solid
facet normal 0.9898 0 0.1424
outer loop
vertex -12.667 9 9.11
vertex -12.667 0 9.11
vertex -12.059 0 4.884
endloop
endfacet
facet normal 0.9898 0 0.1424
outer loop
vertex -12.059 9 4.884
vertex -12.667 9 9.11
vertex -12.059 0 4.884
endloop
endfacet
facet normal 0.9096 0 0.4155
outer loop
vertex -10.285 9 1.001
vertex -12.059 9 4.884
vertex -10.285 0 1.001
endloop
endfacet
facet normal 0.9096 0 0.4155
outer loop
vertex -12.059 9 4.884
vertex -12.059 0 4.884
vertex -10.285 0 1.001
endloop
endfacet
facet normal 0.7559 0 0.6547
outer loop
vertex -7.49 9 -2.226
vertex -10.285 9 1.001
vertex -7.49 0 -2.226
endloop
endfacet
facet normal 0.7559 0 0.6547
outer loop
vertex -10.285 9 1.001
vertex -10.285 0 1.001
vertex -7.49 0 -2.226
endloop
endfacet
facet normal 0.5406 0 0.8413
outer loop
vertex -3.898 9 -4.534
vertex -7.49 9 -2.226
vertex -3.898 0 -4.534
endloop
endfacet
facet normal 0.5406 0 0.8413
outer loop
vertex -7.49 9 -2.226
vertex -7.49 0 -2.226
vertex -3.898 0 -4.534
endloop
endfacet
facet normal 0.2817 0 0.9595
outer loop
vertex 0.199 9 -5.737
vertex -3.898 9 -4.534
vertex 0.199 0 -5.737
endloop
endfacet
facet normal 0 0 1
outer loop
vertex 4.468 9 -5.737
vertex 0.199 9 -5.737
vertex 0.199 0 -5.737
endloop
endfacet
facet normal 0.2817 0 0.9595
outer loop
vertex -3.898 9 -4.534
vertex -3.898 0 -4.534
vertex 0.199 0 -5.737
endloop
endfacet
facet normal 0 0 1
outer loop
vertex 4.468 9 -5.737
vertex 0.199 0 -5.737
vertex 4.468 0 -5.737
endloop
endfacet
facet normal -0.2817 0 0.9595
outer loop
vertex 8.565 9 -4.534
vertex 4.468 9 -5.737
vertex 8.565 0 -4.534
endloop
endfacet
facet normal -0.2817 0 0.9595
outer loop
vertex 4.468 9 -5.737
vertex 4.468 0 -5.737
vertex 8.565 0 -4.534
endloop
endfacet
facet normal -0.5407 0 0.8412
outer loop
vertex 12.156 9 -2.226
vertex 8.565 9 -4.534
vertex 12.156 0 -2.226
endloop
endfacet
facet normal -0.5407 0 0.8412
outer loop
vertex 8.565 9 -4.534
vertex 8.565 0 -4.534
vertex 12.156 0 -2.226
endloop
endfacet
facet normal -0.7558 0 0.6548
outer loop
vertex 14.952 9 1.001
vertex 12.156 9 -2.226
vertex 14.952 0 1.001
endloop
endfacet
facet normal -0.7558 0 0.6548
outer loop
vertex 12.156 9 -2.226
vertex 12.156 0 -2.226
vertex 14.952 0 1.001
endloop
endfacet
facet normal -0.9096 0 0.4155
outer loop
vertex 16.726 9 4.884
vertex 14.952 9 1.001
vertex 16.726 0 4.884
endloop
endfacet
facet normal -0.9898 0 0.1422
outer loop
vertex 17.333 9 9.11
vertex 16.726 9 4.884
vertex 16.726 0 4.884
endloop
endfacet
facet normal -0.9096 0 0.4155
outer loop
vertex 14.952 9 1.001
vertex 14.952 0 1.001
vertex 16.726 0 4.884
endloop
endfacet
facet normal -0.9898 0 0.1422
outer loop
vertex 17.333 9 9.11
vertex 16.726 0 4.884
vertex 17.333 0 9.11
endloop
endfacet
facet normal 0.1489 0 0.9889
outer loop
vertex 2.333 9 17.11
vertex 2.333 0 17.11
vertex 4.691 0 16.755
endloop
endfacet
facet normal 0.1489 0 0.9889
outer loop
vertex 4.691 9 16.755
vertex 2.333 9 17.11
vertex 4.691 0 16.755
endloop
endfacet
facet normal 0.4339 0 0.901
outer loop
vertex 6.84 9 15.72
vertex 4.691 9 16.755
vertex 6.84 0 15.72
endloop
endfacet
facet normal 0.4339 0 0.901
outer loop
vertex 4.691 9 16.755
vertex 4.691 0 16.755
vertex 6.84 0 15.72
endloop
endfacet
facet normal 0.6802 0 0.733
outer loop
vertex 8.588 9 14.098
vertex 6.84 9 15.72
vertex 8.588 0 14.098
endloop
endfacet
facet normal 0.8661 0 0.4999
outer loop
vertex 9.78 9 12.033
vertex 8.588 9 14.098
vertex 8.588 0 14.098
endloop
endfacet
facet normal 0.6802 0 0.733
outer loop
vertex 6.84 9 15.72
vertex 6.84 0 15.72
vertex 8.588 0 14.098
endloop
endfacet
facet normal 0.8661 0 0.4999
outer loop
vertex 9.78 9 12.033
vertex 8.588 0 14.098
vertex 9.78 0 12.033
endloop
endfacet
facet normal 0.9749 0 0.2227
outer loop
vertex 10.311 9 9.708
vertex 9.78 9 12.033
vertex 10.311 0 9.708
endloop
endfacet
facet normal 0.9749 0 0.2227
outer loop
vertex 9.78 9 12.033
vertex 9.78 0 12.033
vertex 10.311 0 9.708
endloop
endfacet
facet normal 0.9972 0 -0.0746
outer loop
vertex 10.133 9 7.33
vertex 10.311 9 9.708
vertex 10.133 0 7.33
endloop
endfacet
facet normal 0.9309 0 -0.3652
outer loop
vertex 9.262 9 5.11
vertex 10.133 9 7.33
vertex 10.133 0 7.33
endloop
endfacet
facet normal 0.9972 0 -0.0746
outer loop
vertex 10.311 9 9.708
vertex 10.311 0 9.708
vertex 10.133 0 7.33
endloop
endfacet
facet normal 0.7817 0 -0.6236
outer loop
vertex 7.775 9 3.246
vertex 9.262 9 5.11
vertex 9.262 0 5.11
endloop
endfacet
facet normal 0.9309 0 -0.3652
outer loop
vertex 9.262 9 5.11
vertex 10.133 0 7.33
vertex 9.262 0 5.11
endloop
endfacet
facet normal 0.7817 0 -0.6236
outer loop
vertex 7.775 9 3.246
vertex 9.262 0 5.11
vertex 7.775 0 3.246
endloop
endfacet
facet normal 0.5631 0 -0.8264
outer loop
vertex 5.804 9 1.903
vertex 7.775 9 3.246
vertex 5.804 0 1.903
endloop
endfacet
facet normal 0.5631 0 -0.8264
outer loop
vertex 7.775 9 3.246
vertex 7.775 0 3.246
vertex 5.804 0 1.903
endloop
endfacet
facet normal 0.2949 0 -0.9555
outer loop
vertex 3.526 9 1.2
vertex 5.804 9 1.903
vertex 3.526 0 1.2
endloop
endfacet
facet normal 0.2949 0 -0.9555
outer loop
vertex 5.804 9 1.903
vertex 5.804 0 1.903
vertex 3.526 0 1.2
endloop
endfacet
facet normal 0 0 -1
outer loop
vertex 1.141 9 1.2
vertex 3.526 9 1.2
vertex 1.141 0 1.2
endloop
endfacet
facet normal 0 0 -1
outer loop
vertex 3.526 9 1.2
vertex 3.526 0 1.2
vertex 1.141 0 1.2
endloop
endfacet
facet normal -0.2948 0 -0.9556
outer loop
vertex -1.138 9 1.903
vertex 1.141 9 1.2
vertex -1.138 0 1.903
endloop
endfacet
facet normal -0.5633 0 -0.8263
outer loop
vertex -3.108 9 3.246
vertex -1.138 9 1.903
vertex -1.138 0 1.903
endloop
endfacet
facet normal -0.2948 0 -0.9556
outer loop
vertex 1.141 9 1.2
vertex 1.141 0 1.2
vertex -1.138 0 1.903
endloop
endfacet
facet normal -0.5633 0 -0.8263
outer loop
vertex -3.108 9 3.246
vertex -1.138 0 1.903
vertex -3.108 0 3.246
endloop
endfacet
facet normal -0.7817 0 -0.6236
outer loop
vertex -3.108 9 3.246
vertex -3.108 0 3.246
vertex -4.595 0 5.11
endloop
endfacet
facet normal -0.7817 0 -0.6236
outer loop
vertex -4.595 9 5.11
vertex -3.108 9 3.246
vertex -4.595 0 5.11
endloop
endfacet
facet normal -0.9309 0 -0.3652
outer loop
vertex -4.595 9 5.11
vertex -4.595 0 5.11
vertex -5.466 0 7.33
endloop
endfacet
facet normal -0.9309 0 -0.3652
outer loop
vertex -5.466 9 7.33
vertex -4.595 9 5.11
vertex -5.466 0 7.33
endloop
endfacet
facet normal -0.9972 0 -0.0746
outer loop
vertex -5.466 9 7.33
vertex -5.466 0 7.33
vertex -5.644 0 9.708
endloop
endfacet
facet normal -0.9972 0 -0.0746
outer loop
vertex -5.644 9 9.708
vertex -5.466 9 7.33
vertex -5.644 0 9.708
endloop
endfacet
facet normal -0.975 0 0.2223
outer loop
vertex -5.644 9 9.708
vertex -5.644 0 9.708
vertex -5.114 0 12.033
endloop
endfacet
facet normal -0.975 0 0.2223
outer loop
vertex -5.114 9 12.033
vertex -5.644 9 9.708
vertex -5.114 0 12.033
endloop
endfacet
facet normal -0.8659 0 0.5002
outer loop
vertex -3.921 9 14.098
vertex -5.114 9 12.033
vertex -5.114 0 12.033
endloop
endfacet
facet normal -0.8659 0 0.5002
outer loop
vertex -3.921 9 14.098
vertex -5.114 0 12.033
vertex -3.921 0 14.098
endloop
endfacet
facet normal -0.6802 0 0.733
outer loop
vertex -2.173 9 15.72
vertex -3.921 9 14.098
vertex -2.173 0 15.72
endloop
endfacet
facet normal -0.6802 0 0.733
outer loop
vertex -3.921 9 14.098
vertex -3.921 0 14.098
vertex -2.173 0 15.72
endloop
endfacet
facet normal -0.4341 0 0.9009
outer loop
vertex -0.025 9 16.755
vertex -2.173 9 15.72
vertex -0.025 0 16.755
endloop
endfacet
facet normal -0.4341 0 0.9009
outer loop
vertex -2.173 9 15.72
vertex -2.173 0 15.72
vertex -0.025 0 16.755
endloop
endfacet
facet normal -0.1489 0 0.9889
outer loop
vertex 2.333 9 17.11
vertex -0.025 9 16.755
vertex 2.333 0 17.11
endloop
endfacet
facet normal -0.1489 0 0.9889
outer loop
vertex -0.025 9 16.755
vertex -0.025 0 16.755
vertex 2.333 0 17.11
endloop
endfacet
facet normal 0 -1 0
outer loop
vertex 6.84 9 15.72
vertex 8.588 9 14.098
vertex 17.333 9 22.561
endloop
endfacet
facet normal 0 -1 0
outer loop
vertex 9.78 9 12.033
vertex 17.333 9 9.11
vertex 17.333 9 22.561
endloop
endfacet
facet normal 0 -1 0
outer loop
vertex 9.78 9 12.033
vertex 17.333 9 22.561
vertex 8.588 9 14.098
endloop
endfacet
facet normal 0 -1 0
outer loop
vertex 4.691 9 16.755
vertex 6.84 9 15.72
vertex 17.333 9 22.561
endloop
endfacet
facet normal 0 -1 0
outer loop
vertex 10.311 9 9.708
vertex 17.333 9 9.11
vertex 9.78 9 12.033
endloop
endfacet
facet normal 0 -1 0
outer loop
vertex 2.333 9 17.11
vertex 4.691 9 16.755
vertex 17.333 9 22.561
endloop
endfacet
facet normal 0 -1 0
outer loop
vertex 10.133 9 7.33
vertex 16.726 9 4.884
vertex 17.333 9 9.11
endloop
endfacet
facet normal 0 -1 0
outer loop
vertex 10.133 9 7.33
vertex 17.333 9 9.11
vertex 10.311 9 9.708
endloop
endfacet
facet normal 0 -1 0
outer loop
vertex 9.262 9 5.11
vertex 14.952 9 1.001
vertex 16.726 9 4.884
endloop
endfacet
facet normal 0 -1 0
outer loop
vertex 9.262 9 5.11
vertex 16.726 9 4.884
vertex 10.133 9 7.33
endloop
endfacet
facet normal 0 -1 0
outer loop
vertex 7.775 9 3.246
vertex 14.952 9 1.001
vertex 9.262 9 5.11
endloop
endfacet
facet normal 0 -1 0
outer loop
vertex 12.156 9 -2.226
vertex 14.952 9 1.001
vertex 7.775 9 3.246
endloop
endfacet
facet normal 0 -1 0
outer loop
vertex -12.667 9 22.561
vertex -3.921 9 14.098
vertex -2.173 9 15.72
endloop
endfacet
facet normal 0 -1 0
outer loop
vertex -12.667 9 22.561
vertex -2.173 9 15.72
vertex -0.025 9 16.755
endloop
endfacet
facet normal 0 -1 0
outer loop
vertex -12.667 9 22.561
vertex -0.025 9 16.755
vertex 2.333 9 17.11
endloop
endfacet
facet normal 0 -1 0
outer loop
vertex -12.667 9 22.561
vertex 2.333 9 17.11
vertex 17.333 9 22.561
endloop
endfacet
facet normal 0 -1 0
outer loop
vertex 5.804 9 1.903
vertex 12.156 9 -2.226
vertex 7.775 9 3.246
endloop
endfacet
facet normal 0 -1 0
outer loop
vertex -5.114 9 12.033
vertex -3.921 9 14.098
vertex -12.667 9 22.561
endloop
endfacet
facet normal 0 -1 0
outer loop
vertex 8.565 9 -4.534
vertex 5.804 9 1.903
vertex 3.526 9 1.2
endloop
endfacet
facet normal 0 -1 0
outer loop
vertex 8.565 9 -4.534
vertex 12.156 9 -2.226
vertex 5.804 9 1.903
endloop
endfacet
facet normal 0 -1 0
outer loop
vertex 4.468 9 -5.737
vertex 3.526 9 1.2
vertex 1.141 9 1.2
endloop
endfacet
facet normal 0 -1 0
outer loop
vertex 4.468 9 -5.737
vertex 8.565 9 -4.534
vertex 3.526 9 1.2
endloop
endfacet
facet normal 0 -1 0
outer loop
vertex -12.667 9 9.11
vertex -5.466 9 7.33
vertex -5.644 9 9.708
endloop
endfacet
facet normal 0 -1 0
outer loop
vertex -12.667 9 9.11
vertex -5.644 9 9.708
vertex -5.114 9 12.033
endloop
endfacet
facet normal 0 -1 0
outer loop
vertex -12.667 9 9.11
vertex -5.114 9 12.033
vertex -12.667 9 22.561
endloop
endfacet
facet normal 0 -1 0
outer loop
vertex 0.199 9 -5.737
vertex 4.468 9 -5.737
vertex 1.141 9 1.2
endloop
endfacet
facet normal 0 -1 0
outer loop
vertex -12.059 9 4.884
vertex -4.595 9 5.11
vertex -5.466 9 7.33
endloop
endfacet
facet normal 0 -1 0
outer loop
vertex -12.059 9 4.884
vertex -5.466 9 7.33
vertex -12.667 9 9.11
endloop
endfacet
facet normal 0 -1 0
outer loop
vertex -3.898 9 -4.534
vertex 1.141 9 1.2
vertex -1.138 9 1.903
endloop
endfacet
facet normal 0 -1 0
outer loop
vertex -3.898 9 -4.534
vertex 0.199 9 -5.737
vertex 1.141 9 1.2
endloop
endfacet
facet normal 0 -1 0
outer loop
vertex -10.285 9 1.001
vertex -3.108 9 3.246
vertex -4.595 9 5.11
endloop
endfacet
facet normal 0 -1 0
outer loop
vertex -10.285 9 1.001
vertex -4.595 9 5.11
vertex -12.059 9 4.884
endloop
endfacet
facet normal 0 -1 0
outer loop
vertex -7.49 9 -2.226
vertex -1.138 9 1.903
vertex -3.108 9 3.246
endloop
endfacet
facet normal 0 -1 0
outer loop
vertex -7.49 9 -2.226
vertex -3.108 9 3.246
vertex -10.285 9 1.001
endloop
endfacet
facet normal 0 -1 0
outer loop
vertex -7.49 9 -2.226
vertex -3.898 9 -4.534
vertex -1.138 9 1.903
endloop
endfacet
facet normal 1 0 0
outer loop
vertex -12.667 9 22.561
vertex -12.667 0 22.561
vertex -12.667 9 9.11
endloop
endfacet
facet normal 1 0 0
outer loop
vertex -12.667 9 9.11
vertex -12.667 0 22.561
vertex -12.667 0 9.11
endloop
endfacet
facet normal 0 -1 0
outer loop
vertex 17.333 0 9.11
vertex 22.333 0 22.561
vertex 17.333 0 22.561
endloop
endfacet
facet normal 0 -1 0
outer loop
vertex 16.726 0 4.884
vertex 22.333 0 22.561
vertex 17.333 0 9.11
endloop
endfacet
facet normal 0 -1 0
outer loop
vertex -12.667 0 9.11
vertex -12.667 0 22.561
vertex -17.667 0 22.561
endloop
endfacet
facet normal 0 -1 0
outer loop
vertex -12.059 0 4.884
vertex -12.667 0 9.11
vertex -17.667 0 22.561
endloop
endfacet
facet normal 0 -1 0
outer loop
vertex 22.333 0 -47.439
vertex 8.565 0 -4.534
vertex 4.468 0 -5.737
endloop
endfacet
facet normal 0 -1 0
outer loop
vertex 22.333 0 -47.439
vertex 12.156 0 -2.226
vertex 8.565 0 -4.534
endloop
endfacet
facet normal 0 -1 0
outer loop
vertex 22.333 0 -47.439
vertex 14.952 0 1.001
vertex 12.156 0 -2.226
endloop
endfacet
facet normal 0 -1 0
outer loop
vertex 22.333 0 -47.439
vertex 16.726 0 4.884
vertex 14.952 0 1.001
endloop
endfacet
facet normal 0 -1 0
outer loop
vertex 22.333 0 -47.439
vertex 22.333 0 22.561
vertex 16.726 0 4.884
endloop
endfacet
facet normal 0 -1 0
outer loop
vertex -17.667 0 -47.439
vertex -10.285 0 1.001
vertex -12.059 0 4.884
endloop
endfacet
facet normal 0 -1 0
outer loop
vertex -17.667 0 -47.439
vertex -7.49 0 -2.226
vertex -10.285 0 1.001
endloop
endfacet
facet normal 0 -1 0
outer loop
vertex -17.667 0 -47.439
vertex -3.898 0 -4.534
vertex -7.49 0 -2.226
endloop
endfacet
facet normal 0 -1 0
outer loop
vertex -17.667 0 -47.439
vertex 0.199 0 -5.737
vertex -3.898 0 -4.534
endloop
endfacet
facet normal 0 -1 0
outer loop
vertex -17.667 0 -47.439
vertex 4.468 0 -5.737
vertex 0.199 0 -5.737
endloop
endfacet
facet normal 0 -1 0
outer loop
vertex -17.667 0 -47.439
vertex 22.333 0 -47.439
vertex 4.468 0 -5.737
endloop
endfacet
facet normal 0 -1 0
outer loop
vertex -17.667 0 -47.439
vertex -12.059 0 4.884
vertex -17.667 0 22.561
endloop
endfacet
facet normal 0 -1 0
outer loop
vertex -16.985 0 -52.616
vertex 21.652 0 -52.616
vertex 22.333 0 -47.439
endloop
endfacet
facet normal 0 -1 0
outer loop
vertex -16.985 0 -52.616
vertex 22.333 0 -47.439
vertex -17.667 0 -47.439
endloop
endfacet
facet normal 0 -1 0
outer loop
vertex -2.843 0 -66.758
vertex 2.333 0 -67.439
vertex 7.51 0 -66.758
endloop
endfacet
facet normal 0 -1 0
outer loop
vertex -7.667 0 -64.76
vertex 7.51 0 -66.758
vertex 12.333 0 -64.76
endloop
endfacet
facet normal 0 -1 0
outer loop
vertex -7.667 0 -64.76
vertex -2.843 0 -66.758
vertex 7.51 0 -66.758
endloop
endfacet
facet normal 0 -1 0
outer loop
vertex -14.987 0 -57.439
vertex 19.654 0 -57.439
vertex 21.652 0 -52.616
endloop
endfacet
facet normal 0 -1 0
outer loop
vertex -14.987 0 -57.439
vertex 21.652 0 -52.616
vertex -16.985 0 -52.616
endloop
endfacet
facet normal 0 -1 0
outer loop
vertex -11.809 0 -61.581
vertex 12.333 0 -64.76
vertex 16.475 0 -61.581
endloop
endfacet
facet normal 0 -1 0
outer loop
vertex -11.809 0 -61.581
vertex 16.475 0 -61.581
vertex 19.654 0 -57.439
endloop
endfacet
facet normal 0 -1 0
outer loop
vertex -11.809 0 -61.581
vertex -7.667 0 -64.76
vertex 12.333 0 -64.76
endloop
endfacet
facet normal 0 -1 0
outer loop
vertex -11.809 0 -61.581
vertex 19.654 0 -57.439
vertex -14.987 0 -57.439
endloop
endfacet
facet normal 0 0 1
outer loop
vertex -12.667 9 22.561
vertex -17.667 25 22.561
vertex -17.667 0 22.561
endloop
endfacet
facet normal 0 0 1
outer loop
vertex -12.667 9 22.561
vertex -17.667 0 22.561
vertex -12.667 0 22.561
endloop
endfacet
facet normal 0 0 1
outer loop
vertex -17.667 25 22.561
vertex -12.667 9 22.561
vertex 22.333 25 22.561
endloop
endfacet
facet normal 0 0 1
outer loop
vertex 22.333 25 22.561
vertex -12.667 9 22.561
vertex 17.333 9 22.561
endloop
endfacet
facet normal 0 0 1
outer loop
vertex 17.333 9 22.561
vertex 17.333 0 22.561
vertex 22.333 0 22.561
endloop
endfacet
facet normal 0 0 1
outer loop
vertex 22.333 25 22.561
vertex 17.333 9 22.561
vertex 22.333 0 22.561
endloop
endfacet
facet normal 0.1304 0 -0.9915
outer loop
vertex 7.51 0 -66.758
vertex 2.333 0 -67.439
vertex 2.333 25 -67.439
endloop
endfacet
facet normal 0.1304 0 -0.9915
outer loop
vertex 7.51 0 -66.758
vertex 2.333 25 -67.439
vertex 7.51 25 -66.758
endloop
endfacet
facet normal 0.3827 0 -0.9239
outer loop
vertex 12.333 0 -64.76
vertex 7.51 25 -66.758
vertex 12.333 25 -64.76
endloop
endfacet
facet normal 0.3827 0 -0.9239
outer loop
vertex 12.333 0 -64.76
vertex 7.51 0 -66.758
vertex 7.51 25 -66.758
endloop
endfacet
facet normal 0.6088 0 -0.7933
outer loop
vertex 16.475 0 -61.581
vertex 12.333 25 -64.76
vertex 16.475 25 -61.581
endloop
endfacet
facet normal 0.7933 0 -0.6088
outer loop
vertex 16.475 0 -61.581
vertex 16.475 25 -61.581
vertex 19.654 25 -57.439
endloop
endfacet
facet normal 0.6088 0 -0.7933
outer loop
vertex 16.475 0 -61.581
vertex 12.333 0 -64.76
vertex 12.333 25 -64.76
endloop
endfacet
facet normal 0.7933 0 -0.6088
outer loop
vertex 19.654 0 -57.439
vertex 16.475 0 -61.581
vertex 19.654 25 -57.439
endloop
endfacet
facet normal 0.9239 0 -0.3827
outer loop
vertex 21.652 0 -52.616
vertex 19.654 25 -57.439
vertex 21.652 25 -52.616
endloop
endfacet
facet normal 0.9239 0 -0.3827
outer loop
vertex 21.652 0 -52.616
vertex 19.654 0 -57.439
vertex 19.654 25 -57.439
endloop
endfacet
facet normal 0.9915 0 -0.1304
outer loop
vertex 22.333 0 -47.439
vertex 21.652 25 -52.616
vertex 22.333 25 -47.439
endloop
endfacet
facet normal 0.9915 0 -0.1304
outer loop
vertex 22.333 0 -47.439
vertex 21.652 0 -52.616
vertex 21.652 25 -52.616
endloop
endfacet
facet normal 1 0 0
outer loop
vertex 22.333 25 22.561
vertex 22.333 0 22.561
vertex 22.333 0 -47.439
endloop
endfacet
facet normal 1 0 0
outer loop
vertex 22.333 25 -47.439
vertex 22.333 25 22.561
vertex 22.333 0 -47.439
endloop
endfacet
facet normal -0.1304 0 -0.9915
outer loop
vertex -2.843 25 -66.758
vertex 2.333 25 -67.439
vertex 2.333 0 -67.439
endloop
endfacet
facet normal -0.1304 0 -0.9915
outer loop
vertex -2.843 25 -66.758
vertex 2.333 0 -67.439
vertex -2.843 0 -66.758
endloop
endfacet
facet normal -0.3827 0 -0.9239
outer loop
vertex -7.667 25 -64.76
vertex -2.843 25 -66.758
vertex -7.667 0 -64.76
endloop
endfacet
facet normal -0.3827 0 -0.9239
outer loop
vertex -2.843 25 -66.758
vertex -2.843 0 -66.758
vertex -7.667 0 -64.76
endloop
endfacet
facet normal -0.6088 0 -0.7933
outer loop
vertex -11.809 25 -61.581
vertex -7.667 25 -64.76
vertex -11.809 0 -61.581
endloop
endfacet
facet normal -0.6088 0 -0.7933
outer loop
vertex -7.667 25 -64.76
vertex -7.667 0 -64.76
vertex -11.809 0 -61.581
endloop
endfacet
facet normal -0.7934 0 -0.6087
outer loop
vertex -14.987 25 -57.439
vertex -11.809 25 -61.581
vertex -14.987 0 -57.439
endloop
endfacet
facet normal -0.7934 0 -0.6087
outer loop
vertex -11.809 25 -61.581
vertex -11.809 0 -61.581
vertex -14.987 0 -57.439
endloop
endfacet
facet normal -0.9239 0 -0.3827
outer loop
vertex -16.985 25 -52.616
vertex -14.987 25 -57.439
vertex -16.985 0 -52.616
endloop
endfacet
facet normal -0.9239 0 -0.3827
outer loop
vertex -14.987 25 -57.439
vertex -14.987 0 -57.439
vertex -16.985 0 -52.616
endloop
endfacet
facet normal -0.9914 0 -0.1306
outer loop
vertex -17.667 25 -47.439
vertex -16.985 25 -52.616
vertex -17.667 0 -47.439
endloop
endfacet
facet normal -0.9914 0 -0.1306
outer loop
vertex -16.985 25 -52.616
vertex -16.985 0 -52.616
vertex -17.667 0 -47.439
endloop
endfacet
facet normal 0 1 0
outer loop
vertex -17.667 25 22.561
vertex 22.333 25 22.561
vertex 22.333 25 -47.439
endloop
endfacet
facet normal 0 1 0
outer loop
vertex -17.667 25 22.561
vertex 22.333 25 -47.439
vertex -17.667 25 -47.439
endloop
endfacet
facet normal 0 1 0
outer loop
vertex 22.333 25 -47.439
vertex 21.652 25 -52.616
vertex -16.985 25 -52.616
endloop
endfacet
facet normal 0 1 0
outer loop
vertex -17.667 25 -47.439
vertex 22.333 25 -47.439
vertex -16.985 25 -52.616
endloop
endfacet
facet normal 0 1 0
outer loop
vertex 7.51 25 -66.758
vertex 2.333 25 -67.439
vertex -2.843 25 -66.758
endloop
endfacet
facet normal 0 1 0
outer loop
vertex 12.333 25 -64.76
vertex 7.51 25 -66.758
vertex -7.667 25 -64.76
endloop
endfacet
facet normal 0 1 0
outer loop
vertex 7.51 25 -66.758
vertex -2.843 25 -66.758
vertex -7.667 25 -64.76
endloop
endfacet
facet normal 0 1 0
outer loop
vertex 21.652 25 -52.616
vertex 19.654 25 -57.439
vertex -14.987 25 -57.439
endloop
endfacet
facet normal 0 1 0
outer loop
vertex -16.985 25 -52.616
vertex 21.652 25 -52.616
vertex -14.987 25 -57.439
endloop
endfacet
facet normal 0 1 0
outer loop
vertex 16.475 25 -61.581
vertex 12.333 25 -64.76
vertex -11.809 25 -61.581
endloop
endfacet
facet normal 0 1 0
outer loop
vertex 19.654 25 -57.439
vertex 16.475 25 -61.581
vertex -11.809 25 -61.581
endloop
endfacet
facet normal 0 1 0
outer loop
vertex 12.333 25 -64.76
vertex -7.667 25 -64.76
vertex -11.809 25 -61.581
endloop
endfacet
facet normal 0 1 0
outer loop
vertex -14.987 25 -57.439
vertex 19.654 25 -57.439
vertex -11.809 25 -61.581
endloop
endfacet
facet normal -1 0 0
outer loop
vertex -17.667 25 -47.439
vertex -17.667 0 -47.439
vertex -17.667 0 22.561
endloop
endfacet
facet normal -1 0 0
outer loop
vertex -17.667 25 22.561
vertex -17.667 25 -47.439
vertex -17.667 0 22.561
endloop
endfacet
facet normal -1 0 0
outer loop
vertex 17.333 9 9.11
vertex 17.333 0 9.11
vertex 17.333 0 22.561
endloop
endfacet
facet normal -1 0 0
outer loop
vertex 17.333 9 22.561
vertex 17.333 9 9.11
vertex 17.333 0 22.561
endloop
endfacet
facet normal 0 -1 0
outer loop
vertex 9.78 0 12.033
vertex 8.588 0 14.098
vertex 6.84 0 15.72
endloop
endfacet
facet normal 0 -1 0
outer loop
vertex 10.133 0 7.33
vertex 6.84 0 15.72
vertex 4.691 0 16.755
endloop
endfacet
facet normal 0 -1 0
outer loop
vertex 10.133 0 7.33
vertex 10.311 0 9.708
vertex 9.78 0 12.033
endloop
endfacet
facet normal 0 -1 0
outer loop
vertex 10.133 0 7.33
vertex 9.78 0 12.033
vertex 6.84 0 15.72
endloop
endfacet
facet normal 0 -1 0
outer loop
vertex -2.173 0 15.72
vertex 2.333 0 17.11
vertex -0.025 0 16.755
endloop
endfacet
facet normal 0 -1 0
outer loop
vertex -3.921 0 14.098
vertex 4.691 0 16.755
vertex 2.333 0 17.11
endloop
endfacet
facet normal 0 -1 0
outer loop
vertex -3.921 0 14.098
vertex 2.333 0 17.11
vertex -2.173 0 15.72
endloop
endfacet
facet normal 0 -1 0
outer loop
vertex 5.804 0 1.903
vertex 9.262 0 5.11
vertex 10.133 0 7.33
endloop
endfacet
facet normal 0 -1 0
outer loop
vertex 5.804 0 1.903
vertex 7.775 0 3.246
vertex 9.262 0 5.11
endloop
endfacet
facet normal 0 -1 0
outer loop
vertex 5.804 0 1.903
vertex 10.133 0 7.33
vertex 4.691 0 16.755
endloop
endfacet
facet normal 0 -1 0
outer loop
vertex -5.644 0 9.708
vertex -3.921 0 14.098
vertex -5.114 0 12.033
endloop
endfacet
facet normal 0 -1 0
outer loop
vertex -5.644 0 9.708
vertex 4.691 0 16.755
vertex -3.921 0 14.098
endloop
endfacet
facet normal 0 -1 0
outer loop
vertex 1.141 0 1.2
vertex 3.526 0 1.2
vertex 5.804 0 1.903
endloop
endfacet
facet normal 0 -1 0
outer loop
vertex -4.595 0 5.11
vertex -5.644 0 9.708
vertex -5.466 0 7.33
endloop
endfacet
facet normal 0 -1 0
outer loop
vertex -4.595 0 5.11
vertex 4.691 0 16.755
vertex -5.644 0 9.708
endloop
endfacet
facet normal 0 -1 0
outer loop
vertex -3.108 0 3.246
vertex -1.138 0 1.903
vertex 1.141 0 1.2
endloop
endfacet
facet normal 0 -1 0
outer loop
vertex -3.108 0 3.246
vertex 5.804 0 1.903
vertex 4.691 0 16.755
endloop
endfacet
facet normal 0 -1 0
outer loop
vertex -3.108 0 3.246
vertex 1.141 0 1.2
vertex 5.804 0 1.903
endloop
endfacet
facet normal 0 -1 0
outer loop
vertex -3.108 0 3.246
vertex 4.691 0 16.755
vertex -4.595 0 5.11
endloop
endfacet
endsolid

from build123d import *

# Parameters (mm, degrees)
RESSALTO_EXTRUS_O1_DEPTH = 25
ESBO_O2_R                = 8
CORTE_EXTRUS_O2_DEPTH    = 9


with BuildPart() as part:
    # Esboço1 → Ressalto-extrusão1 (new body)
    with BuildSketch(Plane(origin=(0, 0, 0), x_dir=(1, 0, 0), z_dir=(0, 1, 0))):
        Polygon((-17.666653224, -22.560793644), (-17.666653224, 0), (-17.666653224, 47.439206356), (2.333346776, 47.439206356), (22.333346776, 47.439206356), (22.333346776, 0), (22.333346776, -22.560793644), (2.333346776, -22.560793644), align=None)
        with BuildLine():
            ThreePointArc((2.333346776, 67.439206356), (16.4754824, 61.581341979), (22.333346776, 47.439206356))
            Line((22.333346776, 47.439206356), (2.333346776, 47.439206356))
            Line((2.333346776, 47.439206356), (2.333346776, 67.439206356))
        make_face()
        with BuildLine():
            Line((2.333346776, 47.439206356), (2.333346776, 67.439206356))
            ThreePointArc((2.333346776, 67.439206356), (-11.808788848, 61.581341979), (-17.666653224, 47.439206356))
            Line((-17.666653224, 47.439206356), (2.333346776, 47.439206356))
        make_face()
    extrude(amount=RESSALTO_EXTRUS_O1_DEPTH)

    # Esboço2 → Corte-extrusão2 (cut)
    with BuildSketch(Plane(origin=(0, 0, 0), x_dir=(1, 0, 0), z_dir=(0, 1, 0))):
        with BuildLine():
            Line((-12.666653224, -22.560793644), (-12.666653224, -9.110478183))
            ThreePointArc((-12.666653224, -9.110478183), (2.333346776, 5.889521817), (17.333346776, -9.110478183))
            Line((17.333346776, -9.110478183), (17.333346776, -22.560793644))
            Line((17.333346776, -22.560793644), (-12.666653224, -22.560793644))
        make_face()
        with Locations(Location((2.333346776, -9.110478183, 0), (0, 0, 270))):
            Circle(ESBO_O2_R, mode=Mode.SUBTRACT)
    extrude(amount=CORTE_EXTRUS_O2_DEPTH, mode=Mode.SUBTRACT)


solid = part.part
